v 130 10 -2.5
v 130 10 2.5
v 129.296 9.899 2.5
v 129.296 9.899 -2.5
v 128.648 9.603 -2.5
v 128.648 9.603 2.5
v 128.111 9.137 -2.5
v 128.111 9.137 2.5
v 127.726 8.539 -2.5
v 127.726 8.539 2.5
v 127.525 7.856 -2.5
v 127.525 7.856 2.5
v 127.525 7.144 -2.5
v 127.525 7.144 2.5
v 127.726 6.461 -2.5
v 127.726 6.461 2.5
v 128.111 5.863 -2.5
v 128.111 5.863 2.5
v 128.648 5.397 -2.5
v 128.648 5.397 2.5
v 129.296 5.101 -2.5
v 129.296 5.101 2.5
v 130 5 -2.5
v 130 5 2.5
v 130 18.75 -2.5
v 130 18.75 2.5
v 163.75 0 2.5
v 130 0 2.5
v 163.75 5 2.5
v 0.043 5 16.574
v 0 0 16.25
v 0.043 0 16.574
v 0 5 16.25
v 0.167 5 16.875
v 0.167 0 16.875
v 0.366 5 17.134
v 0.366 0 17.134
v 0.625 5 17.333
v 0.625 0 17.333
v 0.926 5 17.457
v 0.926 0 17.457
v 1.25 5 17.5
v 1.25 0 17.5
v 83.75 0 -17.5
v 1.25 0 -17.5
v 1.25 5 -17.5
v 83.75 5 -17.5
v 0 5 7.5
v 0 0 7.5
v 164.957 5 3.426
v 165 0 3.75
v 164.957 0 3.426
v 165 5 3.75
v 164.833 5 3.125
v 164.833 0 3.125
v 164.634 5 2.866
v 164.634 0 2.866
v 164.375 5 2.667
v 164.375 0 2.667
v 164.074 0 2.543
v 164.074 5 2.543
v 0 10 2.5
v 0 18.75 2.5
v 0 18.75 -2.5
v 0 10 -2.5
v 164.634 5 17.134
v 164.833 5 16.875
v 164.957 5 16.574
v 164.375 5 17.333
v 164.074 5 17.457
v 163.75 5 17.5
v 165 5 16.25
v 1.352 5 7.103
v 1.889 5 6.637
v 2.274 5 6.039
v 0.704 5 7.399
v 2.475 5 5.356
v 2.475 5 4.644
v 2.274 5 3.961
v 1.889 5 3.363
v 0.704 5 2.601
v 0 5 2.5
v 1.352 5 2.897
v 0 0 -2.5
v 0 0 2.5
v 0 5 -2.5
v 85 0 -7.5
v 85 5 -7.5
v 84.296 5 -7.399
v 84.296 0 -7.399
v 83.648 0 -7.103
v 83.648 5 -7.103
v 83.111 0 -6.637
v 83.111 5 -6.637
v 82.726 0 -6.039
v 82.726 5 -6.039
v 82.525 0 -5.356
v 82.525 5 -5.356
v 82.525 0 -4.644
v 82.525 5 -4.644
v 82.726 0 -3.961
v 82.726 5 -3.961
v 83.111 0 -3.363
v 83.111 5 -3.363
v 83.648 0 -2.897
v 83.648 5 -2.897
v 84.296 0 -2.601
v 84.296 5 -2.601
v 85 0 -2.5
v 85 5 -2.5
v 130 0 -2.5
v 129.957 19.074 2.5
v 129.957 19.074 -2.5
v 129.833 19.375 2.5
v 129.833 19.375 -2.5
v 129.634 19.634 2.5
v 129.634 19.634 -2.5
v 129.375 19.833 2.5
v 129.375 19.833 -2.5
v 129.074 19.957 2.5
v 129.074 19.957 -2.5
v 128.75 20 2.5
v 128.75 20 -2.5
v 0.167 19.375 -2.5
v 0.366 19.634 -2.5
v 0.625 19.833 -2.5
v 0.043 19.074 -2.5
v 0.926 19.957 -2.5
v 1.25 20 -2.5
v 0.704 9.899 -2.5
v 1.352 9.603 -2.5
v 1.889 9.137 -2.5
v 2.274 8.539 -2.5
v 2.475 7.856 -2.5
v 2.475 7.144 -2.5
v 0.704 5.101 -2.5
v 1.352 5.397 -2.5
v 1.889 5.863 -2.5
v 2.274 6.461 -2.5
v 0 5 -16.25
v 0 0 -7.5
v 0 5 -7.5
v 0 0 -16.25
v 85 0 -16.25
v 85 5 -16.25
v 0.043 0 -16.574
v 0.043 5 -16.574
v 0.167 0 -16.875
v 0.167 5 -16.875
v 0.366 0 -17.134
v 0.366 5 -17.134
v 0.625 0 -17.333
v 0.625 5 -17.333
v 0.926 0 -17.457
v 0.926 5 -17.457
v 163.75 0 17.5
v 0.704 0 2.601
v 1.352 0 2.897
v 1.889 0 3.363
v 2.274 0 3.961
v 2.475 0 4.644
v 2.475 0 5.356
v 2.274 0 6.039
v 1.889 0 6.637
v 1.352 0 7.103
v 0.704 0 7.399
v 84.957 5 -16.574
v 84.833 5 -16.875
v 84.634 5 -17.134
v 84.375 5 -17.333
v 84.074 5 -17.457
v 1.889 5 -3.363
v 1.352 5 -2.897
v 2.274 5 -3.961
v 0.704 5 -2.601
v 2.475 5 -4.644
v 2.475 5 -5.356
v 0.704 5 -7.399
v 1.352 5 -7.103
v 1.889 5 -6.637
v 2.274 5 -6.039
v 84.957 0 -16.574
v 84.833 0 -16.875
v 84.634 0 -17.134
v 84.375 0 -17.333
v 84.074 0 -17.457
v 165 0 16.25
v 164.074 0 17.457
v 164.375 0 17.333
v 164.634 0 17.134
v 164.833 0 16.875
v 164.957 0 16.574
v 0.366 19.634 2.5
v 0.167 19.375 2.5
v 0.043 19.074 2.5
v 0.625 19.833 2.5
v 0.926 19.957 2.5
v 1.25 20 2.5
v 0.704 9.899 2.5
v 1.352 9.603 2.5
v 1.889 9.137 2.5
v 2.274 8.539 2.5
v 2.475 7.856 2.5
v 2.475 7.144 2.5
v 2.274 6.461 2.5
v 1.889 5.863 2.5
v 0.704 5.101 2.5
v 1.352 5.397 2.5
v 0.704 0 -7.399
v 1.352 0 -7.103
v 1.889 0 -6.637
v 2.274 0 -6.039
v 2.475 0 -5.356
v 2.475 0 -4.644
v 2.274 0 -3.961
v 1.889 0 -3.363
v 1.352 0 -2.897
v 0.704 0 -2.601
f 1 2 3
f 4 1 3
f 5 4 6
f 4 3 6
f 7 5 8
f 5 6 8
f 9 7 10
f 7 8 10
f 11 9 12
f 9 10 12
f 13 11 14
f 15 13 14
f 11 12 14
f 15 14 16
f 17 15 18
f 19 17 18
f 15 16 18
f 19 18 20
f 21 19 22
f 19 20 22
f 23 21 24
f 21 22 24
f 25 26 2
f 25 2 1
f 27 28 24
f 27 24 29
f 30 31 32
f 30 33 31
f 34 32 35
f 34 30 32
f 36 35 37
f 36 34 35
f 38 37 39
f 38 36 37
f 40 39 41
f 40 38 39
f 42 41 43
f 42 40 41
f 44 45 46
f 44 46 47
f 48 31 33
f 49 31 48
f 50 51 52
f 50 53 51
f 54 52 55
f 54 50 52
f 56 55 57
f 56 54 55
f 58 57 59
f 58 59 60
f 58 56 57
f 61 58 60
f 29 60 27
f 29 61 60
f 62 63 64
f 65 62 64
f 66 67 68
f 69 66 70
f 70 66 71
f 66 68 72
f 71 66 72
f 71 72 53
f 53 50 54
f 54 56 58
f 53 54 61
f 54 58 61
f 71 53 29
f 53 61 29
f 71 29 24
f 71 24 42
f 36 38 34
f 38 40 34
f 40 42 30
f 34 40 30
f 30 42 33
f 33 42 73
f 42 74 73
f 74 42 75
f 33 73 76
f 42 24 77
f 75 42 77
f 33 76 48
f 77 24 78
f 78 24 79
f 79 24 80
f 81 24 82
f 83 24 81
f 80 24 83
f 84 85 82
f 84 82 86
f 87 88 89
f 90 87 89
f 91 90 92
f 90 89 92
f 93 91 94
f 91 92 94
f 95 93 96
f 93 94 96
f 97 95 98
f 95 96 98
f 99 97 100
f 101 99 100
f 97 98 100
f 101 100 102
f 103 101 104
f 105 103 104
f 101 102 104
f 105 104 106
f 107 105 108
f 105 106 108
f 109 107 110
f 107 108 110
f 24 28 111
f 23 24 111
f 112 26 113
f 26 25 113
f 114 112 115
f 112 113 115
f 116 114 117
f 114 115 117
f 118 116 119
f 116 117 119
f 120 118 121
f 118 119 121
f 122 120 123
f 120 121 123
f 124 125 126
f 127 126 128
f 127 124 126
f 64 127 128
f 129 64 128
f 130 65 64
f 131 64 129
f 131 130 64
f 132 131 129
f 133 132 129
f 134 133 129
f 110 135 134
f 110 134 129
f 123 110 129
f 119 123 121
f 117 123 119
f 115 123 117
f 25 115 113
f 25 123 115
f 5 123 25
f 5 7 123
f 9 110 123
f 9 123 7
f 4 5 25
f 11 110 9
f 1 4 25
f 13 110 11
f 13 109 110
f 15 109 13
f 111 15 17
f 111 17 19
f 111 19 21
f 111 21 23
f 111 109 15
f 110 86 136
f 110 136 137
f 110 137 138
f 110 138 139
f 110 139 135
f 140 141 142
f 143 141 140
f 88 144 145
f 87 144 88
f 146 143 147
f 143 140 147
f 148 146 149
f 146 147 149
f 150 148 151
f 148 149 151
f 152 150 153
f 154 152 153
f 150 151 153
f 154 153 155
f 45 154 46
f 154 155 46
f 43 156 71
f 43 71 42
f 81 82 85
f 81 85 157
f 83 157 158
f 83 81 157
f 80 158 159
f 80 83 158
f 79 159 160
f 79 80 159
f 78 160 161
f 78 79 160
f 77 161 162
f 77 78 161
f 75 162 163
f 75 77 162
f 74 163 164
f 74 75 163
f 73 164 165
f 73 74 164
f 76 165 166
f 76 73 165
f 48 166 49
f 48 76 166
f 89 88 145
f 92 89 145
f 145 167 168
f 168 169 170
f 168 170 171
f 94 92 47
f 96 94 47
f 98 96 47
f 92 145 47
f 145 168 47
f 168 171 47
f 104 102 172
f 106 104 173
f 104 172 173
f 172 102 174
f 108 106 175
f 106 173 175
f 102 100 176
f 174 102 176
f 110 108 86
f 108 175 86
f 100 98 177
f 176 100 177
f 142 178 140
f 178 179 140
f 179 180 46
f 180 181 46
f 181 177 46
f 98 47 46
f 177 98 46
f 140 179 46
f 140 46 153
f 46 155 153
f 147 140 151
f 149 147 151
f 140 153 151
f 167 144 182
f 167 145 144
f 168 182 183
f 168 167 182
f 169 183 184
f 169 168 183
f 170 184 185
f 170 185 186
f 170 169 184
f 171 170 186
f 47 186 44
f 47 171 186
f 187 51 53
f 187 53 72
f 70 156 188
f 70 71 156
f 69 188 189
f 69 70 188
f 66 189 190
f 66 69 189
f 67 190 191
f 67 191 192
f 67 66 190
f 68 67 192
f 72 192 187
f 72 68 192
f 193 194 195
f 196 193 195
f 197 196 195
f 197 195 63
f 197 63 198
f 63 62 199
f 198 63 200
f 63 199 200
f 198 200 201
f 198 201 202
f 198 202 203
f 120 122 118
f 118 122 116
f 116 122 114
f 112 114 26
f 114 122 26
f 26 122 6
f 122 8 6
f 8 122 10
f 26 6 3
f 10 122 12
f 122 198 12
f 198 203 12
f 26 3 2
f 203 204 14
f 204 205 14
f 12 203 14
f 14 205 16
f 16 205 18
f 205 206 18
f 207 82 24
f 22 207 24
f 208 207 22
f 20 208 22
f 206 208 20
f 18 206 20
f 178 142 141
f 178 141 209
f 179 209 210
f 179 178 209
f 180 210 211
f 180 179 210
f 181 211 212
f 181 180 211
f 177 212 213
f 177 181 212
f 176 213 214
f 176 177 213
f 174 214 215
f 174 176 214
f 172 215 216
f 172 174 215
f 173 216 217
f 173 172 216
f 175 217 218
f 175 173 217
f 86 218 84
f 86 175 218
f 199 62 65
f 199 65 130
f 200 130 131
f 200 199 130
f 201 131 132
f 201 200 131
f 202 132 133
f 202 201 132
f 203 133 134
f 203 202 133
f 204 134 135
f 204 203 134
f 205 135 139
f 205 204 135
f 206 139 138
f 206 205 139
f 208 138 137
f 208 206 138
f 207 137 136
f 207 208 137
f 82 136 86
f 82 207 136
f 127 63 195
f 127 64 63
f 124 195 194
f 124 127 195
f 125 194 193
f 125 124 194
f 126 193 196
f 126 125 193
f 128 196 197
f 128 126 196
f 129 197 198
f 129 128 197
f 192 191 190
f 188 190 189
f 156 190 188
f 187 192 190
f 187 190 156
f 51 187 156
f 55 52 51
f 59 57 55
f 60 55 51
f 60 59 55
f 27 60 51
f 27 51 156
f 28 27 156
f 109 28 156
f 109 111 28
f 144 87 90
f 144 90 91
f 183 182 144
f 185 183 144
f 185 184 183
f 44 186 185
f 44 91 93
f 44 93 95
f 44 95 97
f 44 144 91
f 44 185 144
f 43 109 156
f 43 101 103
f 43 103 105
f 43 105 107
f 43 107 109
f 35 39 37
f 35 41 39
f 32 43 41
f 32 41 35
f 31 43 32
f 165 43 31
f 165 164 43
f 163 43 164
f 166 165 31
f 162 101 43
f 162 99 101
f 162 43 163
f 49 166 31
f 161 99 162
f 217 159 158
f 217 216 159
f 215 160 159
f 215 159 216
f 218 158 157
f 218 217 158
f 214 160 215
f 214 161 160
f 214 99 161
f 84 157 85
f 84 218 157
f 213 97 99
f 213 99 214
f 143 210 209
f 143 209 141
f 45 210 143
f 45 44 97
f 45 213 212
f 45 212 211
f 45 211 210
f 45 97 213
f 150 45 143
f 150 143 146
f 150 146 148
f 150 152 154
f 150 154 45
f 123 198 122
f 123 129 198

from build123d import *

# Parameters (mm, degrees)
BASE_DEPTH                = 5
SKETCH2_W                 = 130
SKETCH2_H                 = 5
MIDDLE_EXTRUSION_DEPTH    = 15
FANCY_CUTOUT_DEPTH        = 167.602070815
FANCY_CUTOUT_MIDDLE_DEPTH = 168.406690428
OVERALL_FILLETS_R         = 1.25


with BuildPart() as part:
    # Sketch1 → base (new body)
    with BuildSketch(Plane(origin=(0, 0, 0), x_dir=(1, 0, 0), z_dir=(0, 1, 0))):
        Polygon((0, 0), (0, 17.5), (85, 17.5), (85, 2.5), (130, 2.5), (130, -2.5), (165, -2.5), (165, -17.5), (0, -17.5), align=None)
    extrude(amount=BASE_DEPTH)

    # Sketch2 → middle_extrusion (add)
    with BuildSketch(Plane(origin=(0, 5, 0), x_dir=(1, 0, 0), z_dir=(0, 1, 0))):
        with Locations((65, 0)):
            Rectangle(SKETCH2_W, SKETCH2_H)
    extrude(amount=MIDDLE_EXTRUSION_DEPTH)

    # Sketch3 → fancy_cutout (cut, through all)
    with BuildSketch(Plane(origin=(0, 5, 0), x_dir=(1, 0, 0), z_dir=(0, 1, 0))):
        with BuildLine():
            Line((0, -7.5), (0, -2.5))
            ThreePointArc((0, -2.5), (2.5, -5), (0, -7.5))
        make_face()
        with BuildLine():
            Line((0, 2.5), (0, 7.5))
            ThreePointArc((0, 7.5), (2.5, 5), (0, 2.5))
        make_face()
        with BuildLine():
            Line((85, 2.5), (85, 7.5))
            ThreePointArc((85, 7.5), (82.5, 5), (85, 2.5))
        make_face()
    extrude(amount=-FANCY_CUTOUT_DEPTH, mode=Mode.SUBTRACT)

    # Sketch4 → fancy_cutout_middle (cut, through all)
    with BuildSketch(Plane.XY.offset(2.5)):
        with BuildLine():
            Line((0, 5), (0, 10))
            ThreePointArc((0, 10), (2.5, 7.5), (0, 5))
        make_face()
        with BuildLine():
            Line((130, 5), (130, 10))
            ThreePointArc((130, 10), (127.5, 7.5), (130, 5))
        make_face()
    extrude(amount=-FANCY_CUTOUT_MIDDLE_DEPTH, mode=Mode.SUBTRACT)

    # overall_fillets
    overall_fillets_edges = [part.edges().sort_by_distance(p)[0] for p in [
        (0, 2.5, -17.5),
        (85, 2.5, -17.5),
        (165, 2.5, 2.5),
        (165, 2.5, 17.5),
        (0, 2.5, 17.5),
        (130, 20, 0),
        (0, 20, 0),
    ]]
    fillet(overall_fillets_edges, radius=OVERALL_FILLETS_R)


solid = part.part
